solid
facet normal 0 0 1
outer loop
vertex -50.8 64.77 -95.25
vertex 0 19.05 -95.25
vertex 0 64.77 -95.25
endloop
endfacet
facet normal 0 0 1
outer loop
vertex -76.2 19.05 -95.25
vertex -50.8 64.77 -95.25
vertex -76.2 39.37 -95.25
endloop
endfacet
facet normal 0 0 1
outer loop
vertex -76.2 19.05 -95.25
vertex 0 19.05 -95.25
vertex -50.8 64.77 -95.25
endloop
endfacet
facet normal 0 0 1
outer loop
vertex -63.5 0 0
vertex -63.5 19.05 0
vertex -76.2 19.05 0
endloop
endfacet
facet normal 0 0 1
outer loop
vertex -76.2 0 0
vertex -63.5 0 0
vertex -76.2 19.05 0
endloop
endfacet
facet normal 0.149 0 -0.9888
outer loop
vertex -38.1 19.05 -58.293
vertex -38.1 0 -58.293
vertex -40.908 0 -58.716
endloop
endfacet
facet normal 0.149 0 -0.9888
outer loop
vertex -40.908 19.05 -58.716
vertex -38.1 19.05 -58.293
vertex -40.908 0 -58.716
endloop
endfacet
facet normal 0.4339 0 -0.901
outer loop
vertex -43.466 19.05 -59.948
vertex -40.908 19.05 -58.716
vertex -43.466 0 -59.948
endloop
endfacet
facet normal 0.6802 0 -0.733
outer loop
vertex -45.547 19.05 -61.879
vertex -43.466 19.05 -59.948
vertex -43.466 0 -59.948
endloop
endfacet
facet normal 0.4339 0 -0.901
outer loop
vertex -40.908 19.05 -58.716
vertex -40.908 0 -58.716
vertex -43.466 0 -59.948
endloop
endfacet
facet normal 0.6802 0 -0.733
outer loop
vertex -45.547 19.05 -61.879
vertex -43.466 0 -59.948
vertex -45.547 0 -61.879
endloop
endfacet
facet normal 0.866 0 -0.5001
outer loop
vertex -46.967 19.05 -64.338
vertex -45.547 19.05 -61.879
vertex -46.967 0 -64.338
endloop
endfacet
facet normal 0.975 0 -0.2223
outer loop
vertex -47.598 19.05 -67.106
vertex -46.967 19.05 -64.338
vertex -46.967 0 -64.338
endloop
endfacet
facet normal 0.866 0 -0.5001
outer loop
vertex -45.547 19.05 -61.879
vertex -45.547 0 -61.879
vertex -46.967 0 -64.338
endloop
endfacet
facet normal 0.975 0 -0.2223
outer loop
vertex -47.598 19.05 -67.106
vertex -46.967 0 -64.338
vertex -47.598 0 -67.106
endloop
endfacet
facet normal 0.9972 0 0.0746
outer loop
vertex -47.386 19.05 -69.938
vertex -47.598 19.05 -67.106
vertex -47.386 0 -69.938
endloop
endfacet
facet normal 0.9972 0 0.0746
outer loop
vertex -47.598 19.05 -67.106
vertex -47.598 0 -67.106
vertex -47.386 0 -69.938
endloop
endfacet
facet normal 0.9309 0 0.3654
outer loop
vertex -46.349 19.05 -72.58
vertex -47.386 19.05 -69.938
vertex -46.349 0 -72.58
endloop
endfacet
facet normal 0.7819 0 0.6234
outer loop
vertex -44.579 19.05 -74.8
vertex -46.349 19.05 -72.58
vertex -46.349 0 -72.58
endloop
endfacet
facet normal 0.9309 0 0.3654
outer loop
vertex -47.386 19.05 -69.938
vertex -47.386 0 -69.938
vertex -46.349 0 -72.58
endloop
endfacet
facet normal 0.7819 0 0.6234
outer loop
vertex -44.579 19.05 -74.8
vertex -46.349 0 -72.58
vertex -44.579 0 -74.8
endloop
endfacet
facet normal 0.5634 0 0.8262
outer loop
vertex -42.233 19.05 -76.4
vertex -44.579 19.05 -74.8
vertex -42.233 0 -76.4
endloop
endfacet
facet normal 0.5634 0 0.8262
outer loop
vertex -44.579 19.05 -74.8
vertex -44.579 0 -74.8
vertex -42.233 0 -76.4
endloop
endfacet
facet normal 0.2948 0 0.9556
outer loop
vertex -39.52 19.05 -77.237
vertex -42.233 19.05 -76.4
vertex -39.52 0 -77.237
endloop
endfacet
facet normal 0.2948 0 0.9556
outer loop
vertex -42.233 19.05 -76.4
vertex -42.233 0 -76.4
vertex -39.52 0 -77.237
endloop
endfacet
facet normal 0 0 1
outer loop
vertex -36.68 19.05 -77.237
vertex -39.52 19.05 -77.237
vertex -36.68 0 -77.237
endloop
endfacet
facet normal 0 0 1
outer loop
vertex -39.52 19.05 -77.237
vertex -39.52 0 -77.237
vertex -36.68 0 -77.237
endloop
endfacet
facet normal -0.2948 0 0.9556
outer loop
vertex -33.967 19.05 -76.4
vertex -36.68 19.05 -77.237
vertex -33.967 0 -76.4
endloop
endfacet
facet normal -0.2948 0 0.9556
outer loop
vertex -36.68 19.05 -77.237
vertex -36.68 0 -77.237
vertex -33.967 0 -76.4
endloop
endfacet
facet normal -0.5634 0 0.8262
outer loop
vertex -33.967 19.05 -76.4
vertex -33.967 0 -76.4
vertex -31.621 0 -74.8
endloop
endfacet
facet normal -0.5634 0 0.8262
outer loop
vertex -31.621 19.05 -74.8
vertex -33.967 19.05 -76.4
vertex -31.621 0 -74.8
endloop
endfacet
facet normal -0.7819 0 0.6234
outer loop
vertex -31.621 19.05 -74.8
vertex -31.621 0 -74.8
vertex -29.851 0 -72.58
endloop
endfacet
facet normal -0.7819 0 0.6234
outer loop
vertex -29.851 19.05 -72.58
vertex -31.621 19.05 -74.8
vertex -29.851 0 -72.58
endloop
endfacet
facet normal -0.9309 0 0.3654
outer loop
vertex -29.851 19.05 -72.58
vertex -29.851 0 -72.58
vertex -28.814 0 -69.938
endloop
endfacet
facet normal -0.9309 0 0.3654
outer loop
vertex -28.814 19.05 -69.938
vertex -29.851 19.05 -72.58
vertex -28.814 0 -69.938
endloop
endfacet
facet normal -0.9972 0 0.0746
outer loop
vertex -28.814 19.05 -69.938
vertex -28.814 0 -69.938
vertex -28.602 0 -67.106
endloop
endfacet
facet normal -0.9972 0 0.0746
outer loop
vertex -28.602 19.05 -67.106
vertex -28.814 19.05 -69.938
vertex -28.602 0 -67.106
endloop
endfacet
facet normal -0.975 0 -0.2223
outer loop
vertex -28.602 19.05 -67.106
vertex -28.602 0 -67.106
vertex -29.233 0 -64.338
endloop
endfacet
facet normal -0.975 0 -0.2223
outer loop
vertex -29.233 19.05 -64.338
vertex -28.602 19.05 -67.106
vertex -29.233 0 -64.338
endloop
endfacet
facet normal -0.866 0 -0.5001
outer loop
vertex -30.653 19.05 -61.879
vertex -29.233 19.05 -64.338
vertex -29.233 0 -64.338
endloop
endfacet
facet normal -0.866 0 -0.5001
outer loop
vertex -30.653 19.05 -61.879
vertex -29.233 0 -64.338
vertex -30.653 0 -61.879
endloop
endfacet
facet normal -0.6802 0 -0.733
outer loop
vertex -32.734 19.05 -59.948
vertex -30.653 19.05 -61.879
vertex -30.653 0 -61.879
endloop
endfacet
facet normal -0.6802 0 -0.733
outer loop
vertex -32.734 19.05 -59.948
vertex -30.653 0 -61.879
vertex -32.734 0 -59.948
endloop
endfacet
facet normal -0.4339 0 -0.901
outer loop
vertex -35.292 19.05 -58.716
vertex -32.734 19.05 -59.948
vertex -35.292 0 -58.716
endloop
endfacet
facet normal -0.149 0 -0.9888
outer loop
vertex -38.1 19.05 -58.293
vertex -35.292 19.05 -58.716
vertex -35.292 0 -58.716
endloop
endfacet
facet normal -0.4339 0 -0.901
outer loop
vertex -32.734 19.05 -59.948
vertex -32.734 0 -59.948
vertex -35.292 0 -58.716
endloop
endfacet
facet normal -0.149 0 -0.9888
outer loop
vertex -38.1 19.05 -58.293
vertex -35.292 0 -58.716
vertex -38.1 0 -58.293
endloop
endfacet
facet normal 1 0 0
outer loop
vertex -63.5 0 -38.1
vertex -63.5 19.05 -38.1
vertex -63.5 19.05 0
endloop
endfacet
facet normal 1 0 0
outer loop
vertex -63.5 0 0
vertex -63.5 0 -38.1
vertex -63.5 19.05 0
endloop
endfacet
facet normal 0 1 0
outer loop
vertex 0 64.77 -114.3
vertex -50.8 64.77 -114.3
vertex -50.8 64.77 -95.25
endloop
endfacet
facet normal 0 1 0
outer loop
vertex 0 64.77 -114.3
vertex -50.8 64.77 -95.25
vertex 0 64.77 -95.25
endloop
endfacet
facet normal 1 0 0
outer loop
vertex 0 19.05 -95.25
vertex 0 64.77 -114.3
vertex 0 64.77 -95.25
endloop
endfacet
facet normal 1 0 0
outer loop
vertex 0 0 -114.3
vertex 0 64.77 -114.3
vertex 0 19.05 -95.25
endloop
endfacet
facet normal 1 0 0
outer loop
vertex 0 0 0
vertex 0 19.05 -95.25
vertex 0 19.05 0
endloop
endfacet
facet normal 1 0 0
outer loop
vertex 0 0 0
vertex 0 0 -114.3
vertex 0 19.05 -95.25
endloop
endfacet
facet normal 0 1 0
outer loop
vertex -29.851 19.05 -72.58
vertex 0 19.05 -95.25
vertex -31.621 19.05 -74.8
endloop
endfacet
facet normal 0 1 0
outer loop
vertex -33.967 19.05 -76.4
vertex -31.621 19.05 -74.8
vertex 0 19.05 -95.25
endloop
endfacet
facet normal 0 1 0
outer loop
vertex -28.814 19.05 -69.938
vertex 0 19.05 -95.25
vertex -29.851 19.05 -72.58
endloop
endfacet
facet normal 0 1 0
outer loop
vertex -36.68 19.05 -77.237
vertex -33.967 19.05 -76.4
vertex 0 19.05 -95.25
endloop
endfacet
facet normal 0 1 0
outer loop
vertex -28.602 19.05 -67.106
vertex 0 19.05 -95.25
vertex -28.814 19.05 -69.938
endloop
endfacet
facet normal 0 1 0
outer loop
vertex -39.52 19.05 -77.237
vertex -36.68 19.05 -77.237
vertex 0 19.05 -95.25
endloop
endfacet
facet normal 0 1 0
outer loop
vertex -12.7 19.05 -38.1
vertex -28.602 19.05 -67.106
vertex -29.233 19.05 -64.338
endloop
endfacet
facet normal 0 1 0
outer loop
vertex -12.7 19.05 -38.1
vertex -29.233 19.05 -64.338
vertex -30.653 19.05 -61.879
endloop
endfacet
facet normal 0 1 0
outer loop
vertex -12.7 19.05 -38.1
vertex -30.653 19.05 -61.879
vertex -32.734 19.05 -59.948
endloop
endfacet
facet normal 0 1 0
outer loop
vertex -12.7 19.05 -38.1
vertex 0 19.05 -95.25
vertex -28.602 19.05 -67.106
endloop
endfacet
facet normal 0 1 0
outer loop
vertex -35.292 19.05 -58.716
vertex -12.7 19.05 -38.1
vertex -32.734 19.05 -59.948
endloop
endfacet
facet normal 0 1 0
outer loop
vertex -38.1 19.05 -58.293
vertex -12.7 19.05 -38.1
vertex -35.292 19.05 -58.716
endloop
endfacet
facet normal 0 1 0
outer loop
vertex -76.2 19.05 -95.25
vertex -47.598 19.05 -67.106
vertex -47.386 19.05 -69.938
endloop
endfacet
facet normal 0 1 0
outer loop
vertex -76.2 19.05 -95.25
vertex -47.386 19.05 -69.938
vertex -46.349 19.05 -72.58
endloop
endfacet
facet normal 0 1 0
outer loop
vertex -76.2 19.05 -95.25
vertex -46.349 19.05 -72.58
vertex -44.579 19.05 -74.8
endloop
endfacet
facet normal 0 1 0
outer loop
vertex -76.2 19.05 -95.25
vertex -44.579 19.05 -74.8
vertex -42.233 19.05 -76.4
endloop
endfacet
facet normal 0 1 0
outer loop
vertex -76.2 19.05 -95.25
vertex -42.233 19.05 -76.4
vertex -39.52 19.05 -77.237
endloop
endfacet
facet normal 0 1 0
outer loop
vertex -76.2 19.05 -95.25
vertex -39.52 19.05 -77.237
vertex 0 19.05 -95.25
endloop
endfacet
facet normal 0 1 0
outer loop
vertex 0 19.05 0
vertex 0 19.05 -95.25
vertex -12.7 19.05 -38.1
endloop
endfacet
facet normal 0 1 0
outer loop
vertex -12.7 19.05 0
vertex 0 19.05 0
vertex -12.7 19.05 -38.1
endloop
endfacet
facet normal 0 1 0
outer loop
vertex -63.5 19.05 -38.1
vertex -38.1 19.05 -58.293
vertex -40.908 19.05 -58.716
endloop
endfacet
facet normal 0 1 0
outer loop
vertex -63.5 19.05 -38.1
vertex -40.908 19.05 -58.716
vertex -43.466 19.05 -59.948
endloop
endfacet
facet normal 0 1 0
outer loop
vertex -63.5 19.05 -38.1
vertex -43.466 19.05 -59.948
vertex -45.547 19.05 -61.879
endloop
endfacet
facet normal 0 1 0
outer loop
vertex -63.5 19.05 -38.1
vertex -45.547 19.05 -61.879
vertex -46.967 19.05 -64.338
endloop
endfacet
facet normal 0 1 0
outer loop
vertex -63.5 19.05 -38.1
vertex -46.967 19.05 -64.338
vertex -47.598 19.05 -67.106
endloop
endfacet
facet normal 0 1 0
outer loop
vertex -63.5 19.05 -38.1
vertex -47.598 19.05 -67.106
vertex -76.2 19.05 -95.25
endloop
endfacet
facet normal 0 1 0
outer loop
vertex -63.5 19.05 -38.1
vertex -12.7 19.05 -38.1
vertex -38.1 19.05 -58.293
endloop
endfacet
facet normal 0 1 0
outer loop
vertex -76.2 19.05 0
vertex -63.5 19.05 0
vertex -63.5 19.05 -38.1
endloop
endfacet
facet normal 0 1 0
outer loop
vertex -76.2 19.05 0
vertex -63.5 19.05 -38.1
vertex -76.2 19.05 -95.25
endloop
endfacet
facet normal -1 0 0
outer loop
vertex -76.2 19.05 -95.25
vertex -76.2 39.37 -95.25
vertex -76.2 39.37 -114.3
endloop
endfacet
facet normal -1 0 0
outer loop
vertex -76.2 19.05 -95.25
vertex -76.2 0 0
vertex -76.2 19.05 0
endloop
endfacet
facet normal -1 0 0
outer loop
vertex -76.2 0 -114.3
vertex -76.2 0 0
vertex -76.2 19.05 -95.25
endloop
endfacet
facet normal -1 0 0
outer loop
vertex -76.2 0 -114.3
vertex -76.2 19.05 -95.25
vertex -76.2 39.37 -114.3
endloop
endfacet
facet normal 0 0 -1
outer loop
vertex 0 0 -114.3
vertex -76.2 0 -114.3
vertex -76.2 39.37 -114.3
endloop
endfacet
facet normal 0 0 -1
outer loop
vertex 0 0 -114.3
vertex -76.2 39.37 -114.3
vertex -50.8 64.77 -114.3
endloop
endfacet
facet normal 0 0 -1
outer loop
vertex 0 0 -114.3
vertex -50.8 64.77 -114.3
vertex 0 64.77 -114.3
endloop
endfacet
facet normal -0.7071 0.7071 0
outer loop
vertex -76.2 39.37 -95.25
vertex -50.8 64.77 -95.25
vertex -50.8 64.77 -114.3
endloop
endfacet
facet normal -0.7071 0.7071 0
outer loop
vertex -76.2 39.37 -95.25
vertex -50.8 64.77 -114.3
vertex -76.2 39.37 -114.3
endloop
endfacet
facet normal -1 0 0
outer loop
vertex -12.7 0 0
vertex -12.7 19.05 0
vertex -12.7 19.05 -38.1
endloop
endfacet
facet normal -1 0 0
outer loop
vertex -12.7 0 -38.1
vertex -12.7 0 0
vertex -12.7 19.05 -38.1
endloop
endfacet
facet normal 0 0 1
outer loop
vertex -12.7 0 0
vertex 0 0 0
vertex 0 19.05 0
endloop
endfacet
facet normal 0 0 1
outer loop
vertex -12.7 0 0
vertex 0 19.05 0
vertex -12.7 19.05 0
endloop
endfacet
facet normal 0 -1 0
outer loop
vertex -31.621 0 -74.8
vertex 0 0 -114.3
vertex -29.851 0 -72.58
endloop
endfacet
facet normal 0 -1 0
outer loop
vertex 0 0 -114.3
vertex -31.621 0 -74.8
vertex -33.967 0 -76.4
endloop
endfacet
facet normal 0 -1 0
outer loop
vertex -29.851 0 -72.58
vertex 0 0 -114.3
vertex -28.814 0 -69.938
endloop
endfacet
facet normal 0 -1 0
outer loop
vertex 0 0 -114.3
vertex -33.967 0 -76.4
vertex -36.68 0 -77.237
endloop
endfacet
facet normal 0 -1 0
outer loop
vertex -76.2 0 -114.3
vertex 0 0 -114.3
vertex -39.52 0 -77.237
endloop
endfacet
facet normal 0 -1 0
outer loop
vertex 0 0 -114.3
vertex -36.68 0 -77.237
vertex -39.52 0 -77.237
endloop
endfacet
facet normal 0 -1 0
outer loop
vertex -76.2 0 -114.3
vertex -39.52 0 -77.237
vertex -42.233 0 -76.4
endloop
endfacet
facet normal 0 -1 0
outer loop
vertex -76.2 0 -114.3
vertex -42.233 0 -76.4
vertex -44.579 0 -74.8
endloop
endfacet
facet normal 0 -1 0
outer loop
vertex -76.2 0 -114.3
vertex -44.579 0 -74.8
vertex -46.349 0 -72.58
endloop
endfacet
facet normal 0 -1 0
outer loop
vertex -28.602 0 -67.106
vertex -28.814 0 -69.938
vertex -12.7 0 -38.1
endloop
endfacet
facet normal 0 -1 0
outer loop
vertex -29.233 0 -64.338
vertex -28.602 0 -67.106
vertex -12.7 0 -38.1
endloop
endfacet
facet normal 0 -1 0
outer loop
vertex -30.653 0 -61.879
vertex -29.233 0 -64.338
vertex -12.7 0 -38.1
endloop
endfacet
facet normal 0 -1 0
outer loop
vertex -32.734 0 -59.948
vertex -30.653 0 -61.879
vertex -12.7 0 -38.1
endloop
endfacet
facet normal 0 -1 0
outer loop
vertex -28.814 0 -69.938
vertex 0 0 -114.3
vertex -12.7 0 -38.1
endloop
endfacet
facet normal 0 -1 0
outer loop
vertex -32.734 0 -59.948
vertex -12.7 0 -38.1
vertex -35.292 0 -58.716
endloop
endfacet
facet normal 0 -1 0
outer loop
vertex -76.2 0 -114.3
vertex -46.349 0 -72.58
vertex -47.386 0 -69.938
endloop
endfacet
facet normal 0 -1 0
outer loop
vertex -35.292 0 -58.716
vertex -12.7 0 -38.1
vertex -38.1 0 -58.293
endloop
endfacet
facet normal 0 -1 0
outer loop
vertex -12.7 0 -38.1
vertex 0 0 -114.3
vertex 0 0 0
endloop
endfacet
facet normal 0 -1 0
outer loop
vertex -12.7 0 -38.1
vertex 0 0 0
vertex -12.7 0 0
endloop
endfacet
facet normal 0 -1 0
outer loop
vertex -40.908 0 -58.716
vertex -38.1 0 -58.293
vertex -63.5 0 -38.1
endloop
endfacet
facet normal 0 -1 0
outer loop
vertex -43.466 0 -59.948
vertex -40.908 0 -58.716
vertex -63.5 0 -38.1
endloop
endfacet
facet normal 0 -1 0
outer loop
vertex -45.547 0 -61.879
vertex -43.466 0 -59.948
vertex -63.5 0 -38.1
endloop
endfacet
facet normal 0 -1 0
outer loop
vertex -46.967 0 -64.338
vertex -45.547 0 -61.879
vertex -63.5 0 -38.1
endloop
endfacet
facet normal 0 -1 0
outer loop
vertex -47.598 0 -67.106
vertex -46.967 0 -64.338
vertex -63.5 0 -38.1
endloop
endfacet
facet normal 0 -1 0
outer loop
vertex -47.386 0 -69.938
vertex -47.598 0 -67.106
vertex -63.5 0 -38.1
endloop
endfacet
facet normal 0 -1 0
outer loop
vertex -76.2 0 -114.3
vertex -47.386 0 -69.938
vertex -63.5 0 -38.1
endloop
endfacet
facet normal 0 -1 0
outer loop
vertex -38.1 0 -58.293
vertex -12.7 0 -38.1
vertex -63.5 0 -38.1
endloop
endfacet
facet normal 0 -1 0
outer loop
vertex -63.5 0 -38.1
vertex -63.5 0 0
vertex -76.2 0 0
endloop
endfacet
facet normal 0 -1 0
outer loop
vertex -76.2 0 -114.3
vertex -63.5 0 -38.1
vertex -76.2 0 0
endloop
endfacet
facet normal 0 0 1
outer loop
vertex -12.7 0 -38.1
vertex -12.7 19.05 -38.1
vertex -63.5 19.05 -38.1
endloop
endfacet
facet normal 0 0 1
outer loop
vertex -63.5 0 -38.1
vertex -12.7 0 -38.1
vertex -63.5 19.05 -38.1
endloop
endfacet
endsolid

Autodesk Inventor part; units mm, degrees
ref_plane "YZ Plane" through (0, 0, 0) normal (1, 0, 0) x (0, 1, 0)
ref_plane "XZ Plane" through (0, 0, 0) normal (0, 1, 0) x (-1, 0, 0)
ref_plane "XY Plane" through (0, 0, 0) normal (0, 0, 1) x (1, 0, 0)
sketch "Sketch1" plane through (0, 0, 0) normal (0, 1, 0) x (-1, 0, 0)
  point P0 (0, 0)
sketch "Sketch2" plane through (0, 0, 0) normal (0, 1, 0) x (-1, 0, 0)
  point P0 (0, 0)
sketch "Sketch3" plane through (0, 0, 0) normal (0, 1, 0) x (-1, 0, 0)
  line L0 (0, 0) -> (76.2, 0)
  line L1 (76.2, 0) -> (76.2, -114.3)
  line L2 (76.2, -114.3) -> (0, -114.3)
  line L3 (0, -114.3) -> (0, 0)
  dimension "d0" = 76.2
  dimension "d1" = 114.3
extrude "Extrusion1" add sketch "Sketch3" along normal blind 19.05
sketch "Sketch4" plane through (0, 19.05, 0) normal (0, 1, 0) x (1, 0, 0)
  line L0 (-76.2, 0) -> (0, 0) projected
  line L1 (-63.5, 0) -> (-12.7, 0)
  line L2 (-12.7, 0) -> (-12.7, 38.1)
  line L3 (-12.7, 38.1) -> (-63.5, 38.1)
  line L4 (-63.5, 38.1) -> (-63.5, 0)
  dimension "d4" = 12.7
  dimension "d5" = 50.8
  dimension "d6" = 38.1
extrude "Extrusion2" cut sketch "Sketch4" against normal through all
sketch "Sketch5" plane through (0, 19.05, 0) normal (0, 1, 0) x (1, 0, 0)
  line L0 (-76.2, 114.3) -> (0, 114.3)
  line L1 (0, 114.3) -> (0, 95.25)
  line L2 (0, 95.25) -> (-76.2, 95.25)
  line L3 (-76.2, 95.25) -> (-76.2, 114.3)
  point P0 (0, 0)
  dimension "d9" = 76.2
  dimension "d10" = 19.05
extrude "Extrusion3" add sketch "Sketch5" along normal blind 45.72
sketch "Sketch6" plane through (-76.2, 19.05, -95.25) normal (0, 0, 1) x (1, 0, 0)
  line L0 (0, -19.05) -> (0, 45.72) projected
  line L1 (76.2, 45.72) -> (25.4, 45.72)
  line L2 (0, 45.72) -> (76.2, 45.72) projected
  line L3 (25.4, 45.72) -> (0, 20.32)
  line L4 (0, 20.32) -> (0, 45.72)
  point P0 (76.2, -19.05)
  dimension "d13" = 25.4
  dimension "d15" = 50.8
extrude "Extrusion4" cut sketch "Sketch6" against normal through all
hole "Hole1" at (-38.1, 19.05, -67.818) direction (0, -1, 0) diameter 19.05 end through all
properties part number "3-1"
